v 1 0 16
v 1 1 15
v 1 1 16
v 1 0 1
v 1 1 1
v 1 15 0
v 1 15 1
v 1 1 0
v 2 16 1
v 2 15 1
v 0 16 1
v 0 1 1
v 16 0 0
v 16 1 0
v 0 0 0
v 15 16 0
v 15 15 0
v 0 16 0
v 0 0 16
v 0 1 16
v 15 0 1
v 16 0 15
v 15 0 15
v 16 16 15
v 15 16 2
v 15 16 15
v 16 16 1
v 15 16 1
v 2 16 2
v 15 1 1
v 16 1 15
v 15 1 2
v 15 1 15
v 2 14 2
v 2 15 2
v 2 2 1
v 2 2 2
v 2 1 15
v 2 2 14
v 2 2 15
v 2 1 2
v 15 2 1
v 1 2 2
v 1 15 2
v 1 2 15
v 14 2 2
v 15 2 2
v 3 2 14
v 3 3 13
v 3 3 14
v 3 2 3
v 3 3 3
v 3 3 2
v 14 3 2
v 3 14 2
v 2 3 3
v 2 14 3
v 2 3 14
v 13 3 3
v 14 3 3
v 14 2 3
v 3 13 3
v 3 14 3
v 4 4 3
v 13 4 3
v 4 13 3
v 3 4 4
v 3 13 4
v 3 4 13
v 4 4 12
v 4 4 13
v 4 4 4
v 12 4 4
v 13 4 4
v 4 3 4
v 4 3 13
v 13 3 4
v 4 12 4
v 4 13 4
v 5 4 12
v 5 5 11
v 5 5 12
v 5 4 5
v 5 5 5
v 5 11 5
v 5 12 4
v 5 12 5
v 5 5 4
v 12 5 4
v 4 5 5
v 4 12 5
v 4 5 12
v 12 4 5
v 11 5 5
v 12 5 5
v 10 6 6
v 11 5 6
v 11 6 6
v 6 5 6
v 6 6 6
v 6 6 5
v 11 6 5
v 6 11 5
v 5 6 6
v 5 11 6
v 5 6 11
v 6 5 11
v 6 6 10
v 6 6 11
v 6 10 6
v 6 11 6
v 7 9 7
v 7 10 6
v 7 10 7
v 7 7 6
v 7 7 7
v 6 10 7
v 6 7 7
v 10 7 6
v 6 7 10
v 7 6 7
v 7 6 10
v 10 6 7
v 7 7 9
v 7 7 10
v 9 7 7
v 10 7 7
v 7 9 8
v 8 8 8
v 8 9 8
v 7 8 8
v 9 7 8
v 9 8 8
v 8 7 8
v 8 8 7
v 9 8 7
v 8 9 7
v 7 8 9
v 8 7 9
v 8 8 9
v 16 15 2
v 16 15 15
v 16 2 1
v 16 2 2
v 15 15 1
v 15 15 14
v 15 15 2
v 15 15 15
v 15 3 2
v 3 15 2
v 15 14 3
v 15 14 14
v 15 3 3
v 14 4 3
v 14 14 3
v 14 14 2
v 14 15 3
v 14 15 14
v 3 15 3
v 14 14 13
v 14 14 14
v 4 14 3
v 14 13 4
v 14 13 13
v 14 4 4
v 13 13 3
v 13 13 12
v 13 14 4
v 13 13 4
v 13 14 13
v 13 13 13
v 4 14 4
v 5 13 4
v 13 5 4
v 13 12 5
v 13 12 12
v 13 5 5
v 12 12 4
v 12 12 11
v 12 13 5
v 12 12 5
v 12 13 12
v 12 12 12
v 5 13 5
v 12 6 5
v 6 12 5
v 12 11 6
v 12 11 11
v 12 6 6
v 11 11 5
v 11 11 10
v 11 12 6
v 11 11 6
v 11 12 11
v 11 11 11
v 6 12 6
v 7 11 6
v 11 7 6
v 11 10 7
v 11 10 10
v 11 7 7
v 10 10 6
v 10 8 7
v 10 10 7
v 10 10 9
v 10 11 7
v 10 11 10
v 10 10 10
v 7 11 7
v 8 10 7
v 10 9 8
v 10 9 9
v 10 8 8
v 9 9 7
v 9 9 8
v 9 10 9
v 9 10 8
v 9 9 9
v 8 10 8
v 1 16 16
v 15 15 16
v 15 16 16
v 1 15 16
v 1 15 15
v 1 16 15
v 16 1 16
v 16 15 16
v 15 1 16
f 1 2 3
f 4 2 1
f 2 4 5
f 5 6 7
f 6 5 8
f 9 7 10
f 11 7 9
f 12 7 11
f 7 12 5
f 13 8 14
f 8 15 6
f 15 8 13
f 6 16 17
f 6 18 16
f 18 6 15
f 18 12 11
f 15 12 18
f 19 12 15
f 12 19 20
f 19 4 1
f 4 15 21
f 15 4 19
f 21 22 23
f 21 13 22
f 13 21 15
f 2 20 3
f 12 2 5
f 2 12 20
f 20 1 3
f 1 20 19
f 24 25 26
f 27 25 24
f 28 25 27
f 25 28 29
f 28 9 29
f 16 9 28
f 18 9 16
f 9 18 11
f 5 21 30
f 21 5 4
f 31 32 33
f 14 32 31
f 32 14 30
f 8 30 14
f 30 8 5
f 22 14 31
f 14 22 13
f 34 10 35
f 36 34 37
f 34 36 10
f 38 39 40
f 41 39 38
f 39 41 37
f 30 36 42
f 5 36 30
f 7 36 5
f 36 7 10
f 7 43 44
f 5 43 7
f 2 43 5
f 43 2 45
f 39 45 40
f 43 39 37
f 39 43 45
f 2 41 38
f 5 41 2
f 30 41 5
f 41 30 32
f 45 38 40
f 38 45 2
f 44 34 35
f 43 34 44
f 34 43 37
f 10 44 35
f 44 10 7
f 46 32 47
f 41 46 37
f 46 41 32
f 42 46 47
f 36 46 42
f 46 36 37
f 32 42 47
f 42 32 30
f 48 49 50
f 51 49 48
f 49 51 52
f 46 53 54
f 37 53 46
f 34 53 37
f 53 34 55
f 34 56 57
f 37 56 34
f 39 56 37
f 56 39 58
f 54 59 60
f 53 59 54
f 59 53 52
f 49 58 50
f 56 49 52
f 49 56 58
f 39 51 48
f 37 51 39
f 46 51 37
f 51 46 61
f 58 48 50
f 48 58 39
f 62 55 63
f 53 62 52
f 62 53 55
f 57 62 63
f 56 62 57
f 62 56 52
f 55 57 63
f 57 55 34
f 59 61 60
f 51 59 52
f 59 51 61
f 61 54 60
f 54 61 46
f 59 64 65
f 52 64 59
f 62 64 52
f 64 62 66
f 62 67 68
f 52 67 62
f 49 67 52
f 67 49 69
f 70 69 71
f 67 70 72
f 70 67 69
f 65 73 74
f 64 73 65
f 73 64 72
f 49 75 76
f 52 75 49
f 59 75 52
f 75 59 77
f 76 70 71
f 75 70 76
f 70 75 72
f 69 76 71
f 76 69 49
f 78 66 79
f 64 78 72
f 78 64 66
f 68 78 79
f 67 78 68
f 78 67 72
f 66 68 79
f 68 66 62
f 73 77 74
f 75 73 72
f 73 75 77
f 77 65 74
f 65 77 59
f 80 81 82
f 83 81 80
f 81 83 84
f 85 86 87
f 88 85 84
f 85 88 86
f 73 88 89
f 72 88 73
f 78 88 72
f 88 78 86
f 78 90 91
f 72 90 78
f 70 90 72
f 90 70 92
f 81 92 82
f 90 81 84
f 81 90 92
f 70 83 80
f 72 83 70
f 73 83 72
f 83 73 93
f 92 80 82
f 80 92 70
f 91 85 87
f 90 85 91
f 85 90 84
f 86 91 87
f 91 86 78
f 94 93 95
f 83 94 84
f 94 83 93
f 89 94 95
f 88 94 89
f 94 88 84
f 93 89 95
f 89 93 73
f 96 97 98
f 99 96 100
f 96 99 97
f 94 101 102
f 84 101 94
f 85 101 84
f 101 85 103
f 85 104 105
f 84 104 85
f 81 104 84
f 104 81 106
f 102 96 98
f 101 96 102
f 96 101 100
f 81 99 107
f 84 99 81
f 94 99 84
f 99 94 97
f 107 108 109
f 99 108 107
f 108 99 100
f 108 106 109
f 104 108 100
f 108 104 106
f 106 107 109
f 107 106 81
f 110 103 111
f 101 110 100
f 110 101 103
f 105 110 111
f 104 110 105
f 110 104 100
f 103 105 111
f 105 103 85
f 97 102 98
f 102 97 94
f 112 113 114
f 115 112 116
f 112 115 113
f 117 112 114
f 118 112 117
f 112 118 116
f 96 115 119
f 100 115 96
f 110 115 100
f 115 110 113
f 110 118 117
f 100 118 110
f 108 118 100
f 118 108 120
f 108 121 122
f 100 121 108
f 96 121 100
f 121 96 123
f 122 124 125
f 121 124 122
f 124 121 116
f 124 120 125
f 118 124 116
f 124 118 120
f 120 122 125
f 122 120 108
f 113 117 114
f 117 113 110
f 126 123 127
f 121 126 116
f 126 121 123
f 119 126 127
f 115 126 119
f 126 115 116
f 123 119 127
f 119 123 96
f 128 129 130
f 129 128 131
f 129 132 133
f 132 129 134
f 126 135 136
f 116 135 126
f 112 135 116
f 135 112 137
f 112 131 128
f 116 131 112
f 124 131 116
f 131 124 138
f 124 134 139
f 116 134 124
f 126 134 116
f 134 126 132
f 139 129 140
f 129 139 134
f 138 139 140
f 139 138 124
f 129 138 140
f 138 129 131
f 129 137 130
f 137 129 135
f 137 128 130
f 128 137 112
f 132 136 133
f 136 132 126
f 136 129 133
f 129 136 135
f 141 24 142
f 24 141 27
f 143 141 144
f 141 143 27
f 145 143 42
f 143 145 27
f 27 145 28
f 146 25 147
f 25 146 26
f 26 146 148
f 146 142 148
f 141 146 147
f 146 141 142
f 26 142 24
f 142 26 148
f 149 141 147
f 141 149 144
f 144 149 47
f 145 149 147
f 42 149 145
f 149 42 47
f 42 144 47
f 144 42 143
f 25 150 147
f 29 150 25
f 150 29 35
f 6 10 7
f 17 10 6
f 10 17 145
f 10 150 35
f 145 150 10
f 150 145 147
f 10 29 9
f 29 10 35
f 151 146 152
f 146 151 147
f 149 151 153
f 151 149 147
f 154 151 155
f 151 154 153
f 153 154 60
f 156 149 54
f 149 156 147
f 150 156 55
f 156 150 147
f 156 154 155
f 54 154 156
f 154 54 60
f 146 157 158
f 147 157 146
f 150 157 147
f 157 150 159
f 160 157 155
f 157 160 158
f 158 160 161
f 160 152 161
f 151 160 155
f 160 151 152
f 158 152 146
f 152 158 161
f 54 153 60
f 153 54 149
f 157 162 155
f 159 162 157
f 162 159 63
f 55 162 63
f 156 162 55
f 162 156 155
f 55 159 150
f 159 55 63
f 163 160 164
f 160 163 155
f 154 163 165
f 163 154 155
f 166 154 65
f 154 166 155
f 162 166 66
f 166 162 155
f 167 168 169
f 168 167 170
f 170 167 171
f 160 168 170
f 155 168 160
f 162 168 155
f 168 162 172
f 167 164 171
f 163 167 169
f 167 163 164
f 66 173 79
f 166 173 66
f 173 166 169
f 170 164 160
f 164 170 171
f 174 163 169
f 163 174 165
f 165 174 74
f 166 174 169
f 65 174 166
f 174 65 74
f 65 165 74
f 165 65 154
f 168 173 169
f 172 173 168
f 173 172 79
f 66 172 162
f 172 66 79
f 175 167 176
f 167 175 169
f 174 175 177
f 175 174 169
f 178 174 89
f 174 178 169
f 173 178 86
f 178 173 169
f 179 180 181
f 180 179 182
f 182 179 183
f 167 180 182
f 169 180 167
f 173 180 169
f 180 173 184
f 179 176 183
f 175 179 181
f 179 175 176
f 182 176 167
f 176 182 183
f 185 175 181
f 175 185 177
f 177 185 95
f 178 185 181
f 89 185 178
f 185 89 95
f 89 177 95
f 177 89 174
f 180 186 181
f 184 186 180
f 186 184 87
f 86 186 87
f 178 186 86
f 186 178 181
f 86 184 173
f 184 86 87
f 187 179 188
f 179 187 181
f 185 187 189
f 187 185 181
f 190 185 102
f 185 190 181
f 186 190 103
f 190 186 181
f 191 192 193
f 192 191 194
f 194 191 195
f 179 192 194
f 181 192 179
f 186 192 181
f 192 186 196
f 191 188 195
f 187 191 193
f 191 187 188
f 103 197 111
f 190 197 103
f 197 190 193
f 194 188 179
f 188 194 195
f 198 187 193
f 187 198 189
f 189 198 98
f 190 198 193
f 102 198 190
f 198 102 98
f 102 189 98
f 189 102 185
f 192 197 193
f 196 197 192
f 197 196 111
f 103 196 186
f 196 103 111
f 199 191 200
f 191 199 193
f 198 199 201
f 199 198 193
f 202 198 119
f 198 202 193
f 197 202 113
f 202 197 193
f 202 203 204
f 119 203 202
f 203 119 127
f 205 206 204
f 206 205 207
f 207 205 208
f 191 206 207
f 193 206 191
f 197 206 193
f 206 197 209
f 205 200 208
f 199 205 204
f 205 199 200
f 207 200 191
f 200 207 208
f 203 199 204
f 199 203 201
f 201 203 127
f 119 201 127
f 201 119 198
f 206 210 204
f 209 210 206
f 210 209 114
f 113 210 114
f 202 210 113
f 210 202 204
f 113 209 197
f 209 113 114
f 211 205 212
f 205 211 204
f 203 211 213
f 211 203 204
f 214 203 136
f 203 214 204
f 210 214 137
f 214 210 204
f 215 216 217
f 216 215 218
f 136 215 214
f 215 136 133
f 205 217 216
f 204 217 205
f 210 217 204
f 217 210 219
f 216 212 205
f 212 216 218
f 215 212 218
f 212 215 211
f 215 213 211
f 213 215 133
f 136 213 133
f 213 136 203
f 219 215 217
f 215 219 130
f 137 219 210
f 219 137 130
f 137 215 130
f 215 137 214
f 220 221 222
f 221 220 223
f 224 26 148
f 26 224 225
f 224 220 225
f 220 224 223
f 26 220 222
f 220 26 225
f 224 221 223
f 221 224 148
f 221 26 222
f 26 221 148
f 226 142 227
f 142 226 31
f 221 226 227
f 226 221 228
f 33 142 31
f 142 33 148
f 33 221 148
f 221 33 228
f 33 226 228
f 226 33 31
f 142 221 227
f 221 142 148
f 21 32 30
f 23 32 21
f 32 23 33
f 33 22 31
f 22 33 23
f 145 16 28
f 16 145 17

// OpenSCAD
union() {
    translate([0, 0, 0]) cube([1, 1, 1]);
    translate([0, 0, 1]) cube([1, 1, 1]);
    translate([0, 0, 2]) cube([1, 1, 1]);
    translate([0, 0, 3]) cube([1, 1, 1]);
    translate([0, 0, 4]) cube([1, 1, 1]);
    translate([0, 0, 5]) cube([1, 1, 1]);
    translate([0, 0, 6]) cube([1, 1, 1]);
    translate([0, 0, 7]) cube([1, 1, 1]);
    translate([0, 0, 8]) cube([1, 1, 1]);
    translate([0, 0, 9]) cube([1, 1, 1]);
    translate([0, 0, 10]) cube([1, 1, 1]);
    translate([0, 0, 11]) cube([1, 1, 1]);
    translate([0, 0, 12]) cube([1, 1, 1]);
    translate([0, 0, 13]) cube([1, 1, 1]);
    translate([0, 0, 14]) cube([1, 1, 1]);
    translate([0, 0, 15]) cube([1, 1, 1]);
    translate([0, 1, 0]) cube([1, 1, 1]);
    translate([0, 2, 0]) cube([1, 1, 1]);
    translate([0, 3, 0]) cube([1, 1, 1]);
    translate([0, 4, 0]) cube([1, 1, 1]);
    translate([0, 5, 0]) cube([1, 1, 1]);
    translate([0, 6, 0]) cube([1, 1, 1]);
    translate([0, 7, 0]) cube([1, 1, 1]);
    translate([0, 8, 0]) cube([1, 1, 1]);
    translate([0, 9, 0]) cube([1, 1, 1]);
    translate([0, 10, 0]) cube([1, 1, 1]);
    translate([0, 11, 0]) cube([1, 1, 1]);
    translate([0, 12, 0]) cube([1, 1, 1]);
    translate([0, 13, 0]) cube([1, 1, 1]);
    translate([0, 14, 0]) cube([1, 1, 1]);
    translate([0, 15, 0]) cube([1, 1, 1]);
    translate([1, 0, 0]) cube([1, 1, 1]);
    translate([2, 0, 0]) cube([1, 1, 1]);
    translate([3, 0, 0]) cube([1, 1, 1]);
    translate([4, 0, 0]) cube([1, 1, 1]);
    translate([5, 0, 0]) cube([1, 1, 1]);
    translate([6, 0, 0]) cube([1, 1, 1]);
    translate([7, 0, 0]) cube([1, 1, 1]);
    translate([8, 0, 0]) cube([1, 1, 1]);
    translate([9, 0, 0]) cube([1, 1, 1]);
    translate([10, 0, 0]) cube([1, 1, 1]);
    translate([11, 0, 0]) cube([1, 1, 1]);
    translate([12, 0, 0]) cube([1, 1, 1]);
    translate([13, 0, 0]) cube([1, 1, 1]);
    translate([14, 0, 0]) cube([1, 1, 1]);
    translate([15, 0, 0]) cube([1, 1, 1]);
    translate([1, 1, 1]) cube([1, 1, 1]);
    translate([1, 1, 2]) cube([1, 1, 1]);
    translate([1, 1, 3]) cube([1, 1, 1]);
    translate([1, 1, 4]) cube([1, 1, 1]);
    translate([1, 1, 5]) cube([1, 1, 1]);
    translate([1, 1, 6]) cube([1, 1, 1]);
    translate([1, 1, 7]) cube([1, 1, 1]);
    translate([1, 1, 8]) cube([1, 1, 1]);
    translate([1, 1, 9]) cube([1, 1, 1]);
    translate([1, 1, 10]) cube([1, 1, 1]);
    translate([1, 1, 11]) cube([1, 1, 1]);
    translate([1, 1, 12]) cube([1, 1, 1]);
    translate([1, 1, 13]) cube([1, 1, 1]);
    translate([1, 1, 14]) cube([1, 1, 1]);
    translate([1, 2, 1]) cube([1, 1, 1]);
    translate([1, 3, 1]) cube([1, 1, 1]);
    translate([1, 4, 1]) cube([1, 1, 1]);
    translate([1, 5, 1]) cube([1, 1, 1]);
    translate([1, 6, 1]) cube([1, 1, 1]);
    translate([1, 7, 1]) cube([1, 1, 1]);
    translate([1, 8, 1]) cube([1, 1, 1]);
    translate([1, 9, 1]) cube([1, 1, 1]);
    translate([1, 10, 1]) cube([1, 1, 1]);
    translate([1, 11, 1]) cube([1, 1, 1]);
    translate([1, 12, 1]) cube([1, 1, 1]);
    translate([1, 13, 1]) cube([1, 1, 1]);
    translate([1, 14, 1]) cube([1, 1, 1]);
    translate([2, 1, 1]) cube([1, 1, 1]);
    translate([3, 1, 1]) cube([1, 1, 1]);
    translate([4, 1, 1]) cube([1, 1, 1]);
    translate([5, 1, 1]) cube([1, 1, 1]);
    translate([6, 1, 1]) cube([1, 1, 1]);
    translate([7, 1, 1]) cube([1, 1, 1]);
    translate([8, 1, 1]) cube([1, 1, 1]);
    translate([9, 1, 1]) cube([1, 1, 1]);
    translate([10, 1, 1]) cube([1, 1, 1]);
    translate([11, 1, 1]) cube([1, 1, 1]);
    translate([12, 1, 1]) cube([1, 1, 1]);
    translate([13, 1, 1]) cube([1, 1, 1]);
    translate([14, 1, 1]) cube([1, 1, 1]);
    translate([2, 2, 2]) cube([1, 1, 1]);
    translate([2, 2, 3]) cube([1, 1, 1]);
    translate([2, 2, 4]) cube([1, 1, 1]);
    translate([2, 2, 5]) cube([1, 1, 1]);
    translate([2, 2, 6]) cube([1, 1, 1]);
    translate([2, 2, 7]) cube([1, 1, 1]);
    translate([2, 2, 8]) cube([1, 1, 1]);
    translate([2, 2, 9]) cube([1, 1, 1]);
    translate([2, 2, 10]) cube([1, 1, 1]);
    translate([2, 2, 11]) cube([1, 1, 1]);
    translate([2, 2, 12]) cube([1, 1, 1]);
    translate([2, 2, 13]) cube([1, 1, 1]);
    translate([2, 3, 2]) cube([1, 1, 1]);
    translate([2, 4, 2]) cube([1, 1, 1]);
    translate([2, 5, 2]) cube([1, 1, 1]);
    translate([2, 6, 2]) cube([1, 1, 1]);
    translate([2, 7, 2]) cube([1, 1, 1]);
    translate([2, 8, 2]) cube([1, 1, 1]);
    translate([2, 9, 2]) cube([1, 1, 1]);
    translate([2, 10, 2]) cube([1, 1, 1]);
    translate([2, 11, 2]) cube([1, 1, 1]);
    translate([2, 12, 2]) cube([1, 1, 1]);
    translate([2, 13, 2]) cube([1, 1, 1]);
    translate([3, 2, 2]) cube([1, 1, 1]);
    translate([4, 2, 2]) cube([1, 1, 1]);
    translate([5, 2, 2]) cube([1, 1, 1]);
    translate([6, 2, 2]) cube([1, 1, 1]);
    translate([7, 2, 2]) cube([1, 1, 1]);
    translate([8, 2, 2]) cube([1, 1, 1]);
    translate([9, 2, 2]) cube([1, 1, 1]);
    translate([10, 2, 2]) cube([1, 1, 1]);
    translate([11, 2, 2]) cube([1, 1, 1]);
    translate([12, 2, 2]) cube([1, 1, 1]);
    translate([13, 2, 2]) cube([1, 1, 1]);
    translate([3, 3, 3]) cube([1, 1, 1]);
    translate([3, 3, 4]) cube([1, 1, 1]);
    translate([3, 3, 5]) cube([1, 1, 1]);
    translate([3, 3, 6]) cube([1, 1, 1]);
    translate([3, 3, 7]) cube([1, 1, 1]);
    translate([3, 3, 8]) cube([1, 1, 1]);
    translate([3, 3, 9]) cube([1, 1, 1]);
    translate([3, 3, 10]) cube([1, 1, 1]);
    translate([3, 3, 11]) cube([1, 1, 1]);
    translate([3, 3, 12]) cube([1, 1, 1]);
    translate([3, 4, 3]) cube([1, 1, 1]);
    translate([3, 5, 3]) cube([1, 1, 1]);
    translate([3, 6, 3]) cube([1, 1, 1]);
    translate([3, 7, 3]) cube([1, 1, 1]);
    translate([3, 8, 3]) cube([1, 1, 1]);
    translate([3, 9, 3]) cube([1, 1, 1]);
    translate([3, 10, 3]) cube([1, 1, 1]);
    translate([3, 11, 3]) cube([1, 1, 1]);
    translate([3, 12, 3]) cube([1, 1, 1]);
    translate([4, 3, 3]) cube([1, 1, 1]);
    translate([5, 3, 3]) cube([1, 1, 1]);
    translate([6, 3, 3]) cube([1, 1, 1]);
    translate([7, 3, 3]) cube([1, 1, 1]);
    translate([8, 3, 3]) cube([1, 1, 1]);
    translate([9, 3, 3]) cube([1, 1, 1]);
    translate([10, 3, 3]) cube([1, 1, 1]);
    translate([11, 3, 3]) cube([1, 1, 1]);
    translate([12, 3, 3]) cube([1, 1, 1]);
    translate([4, 4, 4]) cube([1, 1, 1]);
    translate([4, 4, 5]) cube([1, 1, 1]);
    translate([4, 4, 6]) cube([1, 1, 1]);
    translate([4, 4, 7]) cube([1, 1, 1]);
    translate([4, 4, 8]) cube([1, 1, 1]);
    translate([4, 4, 9]) cube([1, 1, 1]);
    translate([4, 4, 10]) cube([1, 1, 1]);
    translate([4, 4, 11]) cube([1, 1, 1]);
    translate([4, 5, 4]) cube([1, 1, 1]);
    translate([4, 6, 4]) cube([1, 1, 1]);
    translate([4, 7, 4]) cube([1, 1, 1]);
    translate([4, 8, 4]) cube([1, 1, 1]);
    translate([4, 9, 4]) cube([1, 1, 1]);
    translate([4, 10, 4]) cube([1, 1, 1]);
    translate([4, 11, 4]) cube([1, 1, 1]);
    translate([5, 4, 4]) cube([1, 1, 1]);
    translate([6, 4, 4]) cube([1, 1, 1]);
    translate([7, 4, 4]) cube([1, 1, 1]);
    translate([8, 4, 4]) cube([1, 1, 1]);
    translate([9, 4, 4]) cube([1, 1, 1]);
    translate([10, 4, 4]) cube([1, 1, 1]);
    translate([11, 4, 4]) cube([1, 1, 1]);
    translate([5, 5, 5]) cube([1, 1, 1]);
    translate([5, 5, 6]) cube([1, 1, 1]);
    translate([5, 5, 7]) cube([1, 1, 1]);
    translate([5, 5, 8]) cube([1, 1, 1]);
    translate([5, 5, 9]) cube([1, 1, 1]);
    translate([5, 5, 10]) cube([1, 1, 1]);
    translate([5, 6, 5]) cube([1, 1, 1]);
    translate([5, 7, 5]) cube([1, 1, 1]);
    translate([5, 8, 5]) cube([1, 1, 1]);
    translate([5, 9, 5]) cube([1, 1, 1]);
    translate([5, 10, 5]) cube([1, 1, 1]);
    translate([6, 5, 5]) cube([1, 1, 1]);
    translate([7, 5, 5]) cube([1, 1, 1]);
    translate([8, 5, 5]) cube([1, 1, 1]);
    translate([9, 5, 5]) cube([1, 1, 1]);
    translate([10, 5, 5]) cube([1, 1, 1]);
    translate([6, 6, 6]) cube([1, 1, 1]);
    translate([6, 6, 7]) cube([1, 1, 1]);
    translate([6, 6, 8]) cube([1, 1, 1]);
    translate([6, 6, 9]) cube([1, 1, 1]);
    translate([6, 7, 6]) cube([1, 1, 1]);
    translate([6, 8, 6]) cube([1, 1, 1]);
    translate([6, 9, 6]) cube([1, 1, 1]);
    translate([7, 6, 6]) cube([1, 1, 1]);
    translate([8, 6, 6]) cube([1, 1, 1]);
    translate([9, 6, 6]) cube([1, 1, 1]);
    translate([7, 7, 7]) cube([1, 1, 1]);
    translate([7, 7, 8]) cube([1, 1, 1]);
    translate([7, 8, 7]) cube([1, 1, 1]);
    translate([8, 7, 7]) cube([1, 1, 1]);
    translate([15, 15, 1]) cube([1, 1, 1]);
    translate([15, 15, 2]) cube([1, 1, 1]);
    translate([15, 15, 3]) cube([1, 1, 1]);
    translate([15, 15, 4]) cube([1, 1, 1]);
    translate([15, 15, 5]) cube([1, 1, 1]);
    translate([15, 15, 6]) cube([1, 1, 1]);
    translate([15, 15, 7]) cube([1, 1, 1]);
    translate([15, 15, 8]) cube([1, 1, 1]);
    translate([15, 15, 9]) cube([1, 1, 1]);
    translate([15, 15, 10]) cube([1, 1, 1]);
    translate([15, 15, 11]) cube([1, 1, 1]);
    translate([15, 15, 12]) cube([1, 1, 1]);
    translate([15, 15, 13]) cube([1, 1, 1]);
    translate([15, 15, 14]) cube([1, 1, 1]);
    translate([15, 14, 1]) cube([1, 1, 1]);
    translate([15, 13, 1]) cube([1, 1, 1]);
    translate([15, 12, 1]) cube([1, 1, 1]);
    translate([15, 11, 1]) cube([1, 1, 1]);
    translate([15, 10, 1]) cube([1, 1, 1]);
    translate([15, 9, 1]) cube([1, 1, 1]);
    translate([15, 8, 1]) cube([1, 1, 1]);
    translate([15, 7, 1]) cube([1, 1, 1]);
    translate([15, 6, 1]) cube([1, 1, 1]);
    translate([15, 5, 1]) cube([1, 1, 1]);
    translate([15, 4, 1]) cube([1, 1, 1]);
    translate([15, 3, 1]) cube([1, 1, 1]);
    translate([15, 2, 1]) cube([1, 1, 1]);
    translate([14, 15, 1]) cube([1, 1, 1]);
    translate([13, 15, 1]) cube([1, 1, 1]);
    translate([12, 15, 1]) cube([1, 1, 1]);
    translate([11, 15, 1]) cube([1, 1, 1]);
    translate([10, 15, 1]) cube([1, 1, 1]);
    translate([9, 15, 1]) cube([1, 1, 1]);
    translate([8, 15, 1]) cube([1, 1, 1]);
    translate([7, 15, 1]) cube([1, 1, 1]);
    translate([6, 15, 1]) cube([1, 1, 1]);
    translate([5, 15, 1]) cube([1, 1, 1]);
    translate([4, 15, 1]) cube([1, 1, 1]);
    translate([3, 15, 1]) cube([1, 1, 1]);
    translate([2, 15, 1]) cube([1, 1, 1]);
    translate([14, 14, 2]) cube([1, 1, 1]);
    translate([14, 14, 3]) cube([1, 1, 1]);
    translate([14, 14, 4]) cube([1, 1, 1]);
    translate([14, 14, 5]) cube([1, 1, 1]);
    translate([14, 14, 6]) cube([1, 1, 1]);
    translate([14, 14, 7]) cube([1, 1, 1]);
    translate([14, 14, 8]) cube([1, 1, 1]);
    translate([14, 14, 9]) cube([1, 1, 1]);
    translate([14, 14, 10]) cube([1, 1, 1]);
    translate([14, 14, 11]) cube([1, 1, 1]);
    translate([14, 14, 12]) cube([1, 1, 1]);
    translate([14, 14, 13]) cube([1, 1, 1]);
    translate([14, 13, 2]) cube([1, 1, 1]);
    translate([14, 12, 2]) cube([1, 1, 1]);
    translate([14, 11, 2]) cube([1, 1, 1]);
    translate([14, 10, 2]) cube([1, 1, 1]);
    translate([14, 9, 2]) cube([1, 1, 1]);
    translate([14, 8, 2]) cube([1, 1, 1]);
    translate([14, 7, 2]) cube([1, 1, 1]);
    translate([14, 6, 2]) cube([1, 1, 1]);
    translate([14, 5, 2]) cube([1, 1, 1]);
    translate([14, 4, 2]) cube([1, 1, 1]);
    translate([14, 3, 2]) cube([1, 1, 1]);
    translate([13, 14, 2]) cube([1, 1, 1]);
    translate([12, 14, 2]) cube([1, 1, 1]);
    translate([11, 14, 2]) cube([1, 1, 1]);
    translate([10, 14, 2]) cube([1, 1, 1]);
    translate([9, 14, 2]) cube([1, 1, 1]);
    translate([8, 14, 2]) cube([1, 1, 1]);
    translate([7, 14, 2]) cube([1, 1, 1]);
    translate([6, 14, 2]) cube([1, 1, 1]);
    translate([5, 14, 2]) cube([1, 1, 1]);
    translate([4, 14, 2]) cube([1, 1, 1]);
    translate([3, 14, 2]) cube([1, 1, 1]);
    translate([13, 13, 3]) cube([1, 1, 1]);
    translate([13, 13, 4]) cube([1, 1, 1]);
    translate([13, 13, 5]) cube([1, 1, 1]);
    translate([13, 13, 6]) cube([1, 1, 1]);
    translate([13, 13, 7]) cube([1, 1, 1]);
    translate([13, 13, 8]) cube([1, 1, 1]);
    translate([13, 13, 9]) cube([1, 1, 1]);
    translate([13, 13, 10]) cube([1, 1, 1]);
    translate([13, 13, 11]) cube([1, 1, 1]);
    translate([13, 13, 12]) cube([1, 1, 1]);
    translate([13, 12, 3]) cube([1, 1, 1]);
    translate([13, 11, 3]) cube([1, 1, 1]);
    translate([13, 10, 3]) cube([1, 1, 1]);
    translate([13, 9, 3]) cube([1, 1, 1]);
    translate([13, 8, 3]) cube([1, 1, 1]);
    translate([13, 7, 3]) cube([1, 1, 1]);
    translate([13, 6, 3]) cube([1, 1, 1]);
    translate([13, 5, 3]) cube([1, 1, 1]);
    translate([13, 4, 3]) cube([1, 1, 1]);
    translate([12, 13, 3]) cube([1, 1, 1]);
    translate([11, 13, 3]) cube([1, 1, 1]);
    translate([10, 13, 3]) cube([1, 1, 1]);
    translate([9, 13, 3]) cube([1, 1, 1]);
    translate([8, 13, 3]) cube([1, 1, 1]);
    translate([7, 13, 3]) cube([1, 1, 1]);
    translate([6, 13, 3]) cube([1, 1, 1]);
    translate([5, 13, 3]) cube([1, 1, 1]);
    translate([4, 13, 3]) cube([1, 1, 1]);
    translate([12, 12, 4]) cube([1, 1, 1]);
    translate([12, 12, 5]) cube([1, 1, 1]);
    translate([12, 12, 6]) cube([1, 1, 1]);
    translate([12, 12, 7]) cube([1, 1, 1]);
    translate([12, 12, 8]) cube([1, 1, 1]);
    translate([12, 12, 9]) cube([1, 1, 1]);
    translate([12, 12, 10]) cube([1, 1, 1]);
    translate([12, 12, 11]) cube([1, 1, 1]);
    translate([12, 11, 4]) cube([1, 1, 1]);
    translate([12, 10, 4]) cube([1, 1, 1]);
    translate([12, 9, 4]) cube([1, 1, 1]);
    translate([12, 8, 4]) cube([1, 1, 1]);
    translate([12, 7, 4]) cube([1, 1, 1]);
    translate([12, 6, 4]) cube([1, 1, 1]);
    translate([12, 5, 4]) cube([1, 1, 1]);
    translate([11, 12, 4]) cube([1, 1, 1]);
    translate([10, 12, 4]) cube([1, 1, 1]);
    translate([9, 12, 4]) cube([1, 1, 1]);
    translate([8, 12, 4]) cube([1, 1, 1]);
    translate([7, 12, 4]) cube([1, 1, 1]);
    translate([6, 12, 4]) cube([1, 1, 1]);
    translate([5, 12, 4]) cube([1, 1, 1]);
    translate([11, 11, 5]) cube([1, 1, 1]);
    translate([11, 11, 6]) cube([1, 1, 1]);
    translate([11, 11, 7]) cube([1, 1, 1]);
    translate([11, 11, 8]) cube([1, 1, 1]);
    translate([11, 11, 9]) cube([1, 1, 1]);
    translate([11, 11, 10]) cube([1, 1, 1]);
    translate([11, 10, 5]) cube([1, 1, 1]);
    translate([11, 9, 5]) cube([1, 1, 1]);
    translate([11, 8, 5]) cube([1, 1, 1]);
    translate([11, 7, 5]) cube([1, 1, 1]);
    translate([11, 6, 5]) cube([1, 1, 1]);
    translate([10, 11, 5]) cube([1, 1, 1]);
    translate([9, 11, 5]) cube([1, 1, 1]);
    translate([8, 11, 5]) cube([1, 1, 1]);
    translate([7, 11, 5]) cube([1, 1, 1]);
    translate([6, 11, 5]) cube([1, 1, 1]);
    translate([10, 10, 6]) cube([1, 1, 1]);
    translate([10, 10, 7]) cube([1, 1, 1]);
    translate([10, 10, 8]) cube([1, 1, 1]);
    translate([10, 10, 9]) cube([1, 1, 1]);
    translate([10, 9, 6]) cube([1, 1, 1]);
    translate([10, 8, 6]) cube([1, 1, 1]);
    translate([10, 7, 6]) cube([1, 1, 1]);
    translate([9, 10, 6]) cube([1, 1, 1]);
    translate([8, 10, 6]) cube([1, 1, 1]);
    translate([7, 10, 6]) cube([1, 1, 1]);
    translate([9, 9, 7]) cube([1, 1, 1]);
    translate([9, 9, 8]) cube([1, 1, 1]);
    translate([9, 8, 7]) cube([1, 1, 1]);
    translate([8, 9, 7]) cube([1, 1, 1]);
    translate([1, 15, 15]) cube([1, 1, 1]);
    translate([2, 15, 15]) cube([1, 1, 1]);
    translate([3, 15, 15]) cube([1, 1, 1]);
    translate([4, 15, 15]) cube([1, 1, 1]);
    translate([5, 15, 15]) cube([1, 1, 1]);
    translate([6, 15, 15]) cube([1, 1, 1]);
    translate([7, 15, 15]) cube([1, 1, 1]);
    translate([8, 15, 15]) cube([1, 1, 1]);
    translate([9, 15, 15]) cube([1, 1, 1]);
    translate([10, 15, 15]) cube([1, 1, 1]);
    translate([11, 15, 15]) cube([1, 1, 1]);
    translate([12, 15, 15]) cube([1, 1, 1]);
    translate([13, 15, 15]) cube([1, 1, 1]);
    translate([14, 15, 15]) cube([1, 1, 1]);
    translate([15, 1, 15]) cube([1, 1, 1]);
    translate([15, 2, 15]) cube([1, 1, 1]);
    translate([15, 3, 15]) cube([1, 1, 1]);
    translate([15, 4, 15]) cube([1, 1, 1]);
    translate([15, 5, 15]) cube([1, 1, 1]);
    translate([15, 6, 15]) cube([1, 1, 1]);
    translate([15, 7, 15]) cube([1, 1, 1]);
    translate([15, 8, 15]) cube([1, 1, 1]);
    translate([15, 9, 15]) cube([1, 1, 1]);
    translate([15, 10, 15]) cube([1, 1, 1]);
    translate([15, 11, 15]) cube([1, 1, 1]);
    translate([15, 12, 15]) cube([1, 1, 1]);
    translate([15, 13, 15]) cube([1, 1, 1]);
    translate([15, 14, 15]) cube([1, 1, 1]);
    translate([15, 0, 1]) cube([1, 1, 1]);
    translate([15, 0, 2]) cube([1, 1, 1]);
    translate([15, 0, 3]) cube([1, 1, 1]);
    translate([15, 0, 4]) cube([1, 1, 1]);
    translate([15, 0, 5]) cube([1, 1, 1]);
    translate([15, 0, 6]) cube([1, 1, 1]);
    translate([15, 0, 7]) cube([1, 1, 1]);
    translate([15, 0, 8]) cube([1, 1, 1]);
    translate([15, 0, 9]) cube([1, 1, 1]);
    translate([15, 0, 10]) cube([1, 1, 1]);
    translate([15, 0, 11]) cube([1, 1, 1]);
    translate([15, 0, 12]) cube([1, 1, 1]);
    translate([15, 0, 13]) cube([1, 1, 1]);
    translate([15, 0, 14]) cube([1, 1, 1]);
    translate([1, 15, 0]) cube([1, 1, 1]);
    translate([2, 15, 0]) cube([1, 1, 1]);
    translate([3, 15, 0]) cube([1, 1, 1]);
    translate([4, 15, 0]) cube([1, 1, 1]);
    translate([5, 15, 0]) cube([1, 1, 1]);
    translate([6, 15, 0]) cube([1, 1, 1]);
    translate([7, 15, 0]) cube([1, 1, 1]);
    translate([8, 15, 0]) cube([1, 1, 1]);
    translate([9, 15, 0]) cube([1, 1, 1]);
    translate([10, 15, 0]) cube([1, 1, 1]);
    translate([11, 15, 0]) cube([1, 1, 1]);
    translate([12, 15, 0]) cube([1, 1, 1]);
    translate([13, 15, 0]) cube([1, 1, 1]);
    translate([14, 15, 0]) cube([1, 1, 1]);
}
